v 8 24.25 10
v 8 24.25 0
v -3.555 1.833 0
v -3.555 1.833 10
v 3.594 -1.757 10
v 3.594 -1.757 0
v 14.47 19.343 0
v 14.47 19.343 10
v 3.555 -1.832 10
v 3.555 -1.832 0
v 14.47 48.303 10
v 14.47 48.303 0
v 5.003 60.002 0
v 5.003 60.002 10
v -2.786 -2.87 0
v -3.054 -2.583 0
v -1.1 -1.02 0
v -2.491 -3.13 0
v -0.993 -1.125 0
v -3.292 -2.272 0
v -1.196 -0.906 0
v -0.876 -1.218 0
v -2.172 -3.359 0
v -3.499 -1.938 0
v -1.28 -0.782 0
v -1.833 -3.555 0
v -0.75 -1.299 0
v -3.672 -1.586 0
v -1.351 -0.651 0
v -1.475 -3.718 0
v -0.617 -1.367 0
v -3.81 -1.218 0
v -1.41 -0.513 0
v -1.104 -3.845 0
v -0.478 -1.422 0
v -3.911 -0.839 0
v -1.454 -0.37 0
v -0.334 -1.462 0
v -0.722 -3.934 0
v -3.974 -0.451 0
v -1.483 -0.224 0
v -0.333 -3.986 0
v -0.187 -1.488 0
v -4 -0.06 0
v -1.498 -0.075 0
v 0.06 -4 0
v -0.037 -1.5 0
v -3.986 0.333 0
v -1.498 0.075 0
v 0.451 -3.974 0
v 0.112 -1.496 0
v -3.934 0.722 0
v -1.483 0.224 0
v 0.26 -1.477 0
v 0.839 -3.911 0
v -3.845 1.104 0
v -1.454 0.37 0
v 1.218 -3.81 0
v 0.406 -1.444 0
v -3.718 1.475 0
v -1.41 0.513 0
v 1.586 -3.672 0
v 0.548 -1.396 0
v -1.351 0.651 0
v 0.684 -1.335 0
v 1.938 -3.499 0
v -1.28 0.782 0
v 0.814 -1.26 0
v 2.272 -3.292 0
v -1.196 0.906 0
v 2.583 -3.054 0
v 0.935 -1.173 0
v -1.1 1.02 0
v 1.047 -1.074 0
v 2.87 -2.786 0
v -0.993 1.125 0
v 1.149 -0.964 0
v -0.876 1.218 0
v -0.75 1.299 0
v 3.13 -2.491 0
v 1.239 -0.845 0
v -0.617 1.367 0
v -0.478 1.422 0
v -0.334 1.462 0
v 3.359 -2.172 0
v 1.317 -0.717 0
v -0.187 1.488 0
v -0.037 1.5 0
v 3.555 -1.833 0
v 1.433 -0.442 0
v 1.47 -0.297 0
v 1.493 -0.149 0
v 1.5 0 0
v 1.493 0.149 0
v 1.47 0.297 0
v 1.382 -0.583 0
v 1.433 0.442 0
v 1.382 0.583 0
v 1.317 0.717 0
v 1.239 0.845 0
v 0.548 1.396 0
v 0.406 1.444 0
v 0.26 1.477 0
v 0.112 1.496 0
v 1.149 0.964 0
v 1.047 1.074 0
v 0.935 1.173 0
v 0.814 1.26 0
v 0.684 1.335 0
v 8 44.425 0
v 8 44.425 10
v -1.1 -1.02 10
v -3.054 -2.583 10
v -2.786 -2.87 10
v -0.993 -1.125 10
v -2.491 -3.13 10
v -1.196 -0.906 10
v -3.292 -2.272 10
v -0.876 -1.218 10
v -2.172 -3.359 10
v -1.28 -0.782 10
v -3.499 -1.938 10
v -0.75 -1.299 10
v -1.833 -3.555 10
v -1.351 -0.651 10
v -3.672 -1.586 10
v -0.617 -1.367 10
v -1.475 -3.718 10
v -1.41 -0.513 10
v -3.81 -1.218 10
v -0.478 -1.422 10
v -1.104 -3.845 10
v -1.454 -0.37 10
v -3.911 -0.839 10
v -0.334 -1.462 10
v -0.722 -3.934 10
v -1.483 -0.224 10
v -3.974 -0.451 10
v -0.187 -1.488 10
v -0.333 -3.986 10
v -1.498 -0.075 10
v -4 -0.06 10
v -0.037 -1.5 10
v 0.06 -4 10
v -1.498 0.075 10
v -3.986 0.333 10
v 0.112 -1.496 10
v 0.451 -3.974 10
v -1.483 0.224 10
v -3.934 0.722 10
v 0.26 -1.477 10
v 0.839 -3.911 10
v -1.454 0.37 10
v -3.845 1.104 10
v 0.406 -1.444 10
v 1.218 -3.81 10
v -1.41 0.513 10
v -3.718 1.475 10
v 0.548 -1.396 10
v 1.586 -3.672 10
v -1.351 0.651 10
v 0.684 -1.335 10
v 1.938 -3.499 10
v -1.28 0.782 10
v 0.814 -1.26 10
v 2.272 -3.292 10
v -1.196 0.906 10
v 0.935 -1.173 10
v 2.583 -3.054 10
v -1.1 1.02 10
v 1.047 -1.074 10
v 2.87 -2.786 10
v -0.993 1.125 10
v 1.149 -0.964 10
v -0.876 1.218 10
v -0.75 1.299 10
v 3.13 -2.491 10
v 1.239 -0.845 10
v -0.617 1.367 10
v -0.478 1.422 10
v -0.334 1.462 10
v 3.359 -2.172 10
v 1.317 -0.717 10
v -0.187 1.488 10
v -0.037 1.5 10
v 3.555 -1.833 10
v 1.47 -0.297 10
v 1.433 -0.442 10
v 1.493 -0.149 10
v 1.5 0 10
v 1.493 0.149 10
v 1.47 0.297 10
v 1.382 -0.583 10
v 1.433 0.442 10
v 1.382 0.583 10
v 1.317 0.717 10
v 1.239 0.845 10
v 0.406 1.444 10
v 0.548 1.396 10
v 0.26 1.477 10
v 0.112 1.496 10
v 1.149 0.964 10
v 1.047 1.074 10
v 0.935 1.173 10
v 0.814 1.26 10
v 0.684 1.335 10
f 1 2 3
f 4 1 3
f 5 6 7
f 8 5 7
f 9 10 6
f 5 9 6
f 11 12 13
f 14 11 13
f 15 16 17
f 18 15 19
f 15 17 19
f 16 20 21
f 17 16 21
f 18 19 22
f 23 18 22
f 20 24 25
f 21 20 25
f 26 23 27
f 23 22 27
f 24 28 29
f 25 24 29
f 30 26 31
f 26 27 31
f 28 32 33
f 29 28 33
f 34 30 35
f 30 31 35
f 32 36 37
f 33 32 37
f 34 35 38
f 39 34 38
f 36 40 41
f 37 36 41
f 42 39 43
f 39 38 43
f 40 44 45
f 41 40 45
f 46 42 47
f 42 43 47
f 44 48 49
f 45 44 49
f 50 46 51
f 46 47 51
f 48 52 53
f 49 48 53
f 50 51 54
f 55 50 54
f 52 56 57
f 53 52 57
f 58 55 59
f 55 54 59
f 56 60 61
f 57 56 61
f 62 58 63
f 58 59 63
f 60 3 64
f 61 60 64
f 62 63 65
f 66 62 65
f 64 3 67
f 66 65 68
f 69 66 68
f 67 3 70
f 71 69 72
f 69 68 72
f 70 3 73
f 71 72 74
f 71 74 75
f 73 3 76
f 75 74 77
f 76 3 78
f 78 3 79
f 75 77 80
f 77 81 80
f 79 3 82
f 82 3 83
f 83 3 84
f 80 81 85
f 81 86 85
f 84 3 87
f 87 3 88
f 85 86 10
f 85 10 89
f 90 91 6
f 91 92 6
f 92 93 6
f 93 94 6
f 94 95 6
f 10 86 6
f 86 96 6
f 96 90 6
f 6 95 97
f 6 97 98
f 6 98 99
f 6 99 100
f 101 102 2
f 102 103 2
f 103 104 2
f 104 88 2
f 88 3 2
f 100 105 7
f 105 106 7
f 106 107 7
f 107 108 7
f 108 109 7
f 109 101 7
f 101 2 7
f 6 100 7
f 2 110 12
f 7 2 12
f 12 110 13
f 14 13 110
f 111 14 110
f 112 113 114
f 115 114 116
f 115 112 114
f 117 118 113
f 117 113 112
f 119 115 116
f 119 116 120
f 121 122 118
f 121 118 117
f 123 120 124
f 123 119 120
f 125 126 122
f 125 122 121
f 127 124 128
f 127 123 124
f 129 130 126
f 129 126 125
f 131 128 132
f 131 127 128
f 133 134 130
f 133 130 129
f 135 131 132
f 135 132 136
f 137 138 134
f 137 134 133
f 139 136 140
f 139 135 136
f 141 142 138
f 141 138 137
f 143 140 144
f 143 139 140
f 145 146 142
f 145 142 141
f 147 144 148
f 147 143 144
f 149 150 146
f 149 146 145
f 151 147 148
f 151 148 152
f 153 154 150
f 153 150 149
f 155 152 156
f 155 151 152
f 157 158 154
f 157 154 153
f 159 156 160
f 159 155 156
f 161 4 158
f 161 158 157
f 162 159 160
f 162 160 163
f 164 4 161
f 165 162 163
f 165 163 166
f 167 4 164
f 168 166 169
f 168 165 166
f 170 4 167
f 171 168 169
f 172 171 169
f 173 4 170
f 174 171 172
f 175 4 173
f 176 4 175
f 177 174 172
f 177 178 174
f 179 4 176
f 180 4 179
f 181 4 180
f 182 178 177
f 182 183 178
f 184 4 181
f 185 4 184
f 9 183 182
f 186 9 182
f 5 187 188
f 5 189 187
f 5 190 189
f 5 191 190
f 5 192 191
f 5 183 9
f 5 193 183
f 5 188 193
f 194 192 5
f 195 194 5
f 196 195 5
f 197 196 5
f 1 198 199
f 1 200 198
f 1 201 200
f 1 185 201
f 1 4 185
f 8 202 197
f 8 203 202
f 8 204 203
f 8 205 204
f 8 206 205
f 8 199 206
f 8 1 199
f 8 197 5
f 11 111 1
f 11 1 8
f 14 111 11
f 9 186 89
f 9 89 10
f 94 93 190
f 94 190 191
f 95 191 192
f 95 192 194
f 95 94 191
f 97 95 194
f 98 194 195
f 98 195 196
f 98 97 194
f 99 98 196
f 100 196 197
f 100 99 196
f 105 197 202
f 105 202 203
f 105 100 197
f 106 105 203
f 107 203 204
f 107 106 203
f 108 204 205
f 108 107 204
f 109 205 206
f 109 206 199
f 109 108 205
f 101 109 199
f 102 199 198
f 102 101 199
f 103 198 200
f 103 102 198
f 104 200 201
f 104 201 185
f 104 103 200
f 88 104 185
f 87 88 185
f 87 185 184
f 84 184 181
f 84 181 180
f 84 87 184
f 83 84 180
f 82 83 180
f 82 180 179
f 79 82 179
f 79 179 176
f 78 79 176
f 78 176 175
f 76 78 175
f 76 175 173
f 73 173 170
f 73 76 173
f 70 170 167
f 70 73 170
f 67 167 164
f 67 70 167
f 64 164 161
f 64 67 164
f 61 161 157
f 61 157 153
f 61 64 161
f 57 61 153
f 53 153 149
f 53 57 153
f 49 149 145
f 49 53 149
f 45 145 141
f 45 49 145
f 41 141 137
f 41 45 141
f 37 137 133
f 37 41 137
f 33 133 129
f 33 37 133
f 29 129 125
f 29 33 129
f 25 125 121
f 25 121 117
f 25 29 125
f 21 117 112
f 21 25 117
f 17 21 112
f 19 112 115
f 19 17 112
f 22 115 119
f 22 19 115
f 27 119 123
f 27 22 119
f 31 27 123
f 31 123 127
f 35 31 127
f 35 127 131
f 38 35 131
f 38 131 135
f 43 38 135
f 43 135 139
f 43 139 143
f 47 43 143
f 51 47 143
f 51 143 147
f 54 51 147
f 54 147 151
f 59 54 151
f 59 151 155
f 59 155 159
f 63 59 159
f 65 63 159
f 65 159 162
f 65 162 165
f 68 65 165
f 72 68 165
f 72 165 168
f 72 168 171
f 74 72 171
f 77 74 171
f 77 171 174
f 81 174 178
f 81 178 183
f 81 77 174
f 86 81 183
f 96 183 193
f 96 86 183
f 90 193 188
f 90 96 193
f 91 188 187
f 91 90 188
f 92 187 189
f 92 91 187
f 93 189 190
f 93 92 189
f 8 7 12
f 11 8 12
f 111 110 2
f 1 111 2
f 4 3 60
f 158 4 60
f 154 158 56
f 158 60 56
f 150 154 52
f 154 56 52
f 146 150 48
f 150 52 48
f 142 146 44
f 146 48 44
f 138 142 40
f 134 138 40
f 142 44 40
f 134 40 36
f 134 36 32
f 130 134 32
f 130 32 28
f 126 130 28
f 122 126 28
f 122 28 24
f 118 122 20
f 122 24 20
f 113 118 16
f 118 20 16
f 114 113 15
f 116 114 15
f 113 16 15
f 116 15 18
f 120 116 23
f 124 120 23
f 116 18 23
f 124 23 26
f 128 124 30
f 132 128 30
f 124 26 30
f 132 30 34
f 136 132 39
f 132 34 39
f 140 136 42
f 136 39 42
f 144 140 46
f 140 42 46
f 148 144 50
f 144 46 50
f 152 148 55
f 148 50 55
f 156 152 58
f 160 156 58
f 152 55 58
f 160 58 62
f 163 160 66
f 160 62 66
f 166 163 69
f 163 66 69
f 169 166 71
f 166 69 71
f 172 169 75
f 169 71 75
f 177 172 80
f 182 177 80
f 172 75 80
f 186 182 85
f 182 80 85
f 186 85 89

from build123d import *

# Parameters (mm, degrees)
SKETCH_1_R      = 1.5
EXTRUDE_1_DEPTH = 10


with BuildPart() as part:
    # 草图1 → 凸台-拉伸1 (new body)
    with BuildSketch(Plane.XY):
        with BuildLine():
            Line((8, 44.424510324), (8, 24.249761918))
            Line((8, 24.249761918), (-3.555429037, 1.832736851))
            ThreePointArc((-3.555429037, 1.832736851), (-1.832736851, -3.555429037), (3.555429037, -1.832736851))
            Line((3.555429037, -1.832736851), (3.554621026, -1.832320341))
            Line((3.554621026, -1.832320341), (3.593691894, -1.756524572))
            Line((3.593691894, -1.756524572), (14.47, 19.343035702))
            Line((14.47, 19.343035702), (14.47, 48.303035702))
            Line((14.47, 48.303035702), (5.002811382, 60.002387807))
            Line((5.002811382, 60.002387807), (8, 44.424510324))
        make_face()
        Circle(SKETCH_1_R, mode=Mode.SUBTRACT)
    extrude(amount=EXTRUDE_1_DEPTH)


solid = part.part
